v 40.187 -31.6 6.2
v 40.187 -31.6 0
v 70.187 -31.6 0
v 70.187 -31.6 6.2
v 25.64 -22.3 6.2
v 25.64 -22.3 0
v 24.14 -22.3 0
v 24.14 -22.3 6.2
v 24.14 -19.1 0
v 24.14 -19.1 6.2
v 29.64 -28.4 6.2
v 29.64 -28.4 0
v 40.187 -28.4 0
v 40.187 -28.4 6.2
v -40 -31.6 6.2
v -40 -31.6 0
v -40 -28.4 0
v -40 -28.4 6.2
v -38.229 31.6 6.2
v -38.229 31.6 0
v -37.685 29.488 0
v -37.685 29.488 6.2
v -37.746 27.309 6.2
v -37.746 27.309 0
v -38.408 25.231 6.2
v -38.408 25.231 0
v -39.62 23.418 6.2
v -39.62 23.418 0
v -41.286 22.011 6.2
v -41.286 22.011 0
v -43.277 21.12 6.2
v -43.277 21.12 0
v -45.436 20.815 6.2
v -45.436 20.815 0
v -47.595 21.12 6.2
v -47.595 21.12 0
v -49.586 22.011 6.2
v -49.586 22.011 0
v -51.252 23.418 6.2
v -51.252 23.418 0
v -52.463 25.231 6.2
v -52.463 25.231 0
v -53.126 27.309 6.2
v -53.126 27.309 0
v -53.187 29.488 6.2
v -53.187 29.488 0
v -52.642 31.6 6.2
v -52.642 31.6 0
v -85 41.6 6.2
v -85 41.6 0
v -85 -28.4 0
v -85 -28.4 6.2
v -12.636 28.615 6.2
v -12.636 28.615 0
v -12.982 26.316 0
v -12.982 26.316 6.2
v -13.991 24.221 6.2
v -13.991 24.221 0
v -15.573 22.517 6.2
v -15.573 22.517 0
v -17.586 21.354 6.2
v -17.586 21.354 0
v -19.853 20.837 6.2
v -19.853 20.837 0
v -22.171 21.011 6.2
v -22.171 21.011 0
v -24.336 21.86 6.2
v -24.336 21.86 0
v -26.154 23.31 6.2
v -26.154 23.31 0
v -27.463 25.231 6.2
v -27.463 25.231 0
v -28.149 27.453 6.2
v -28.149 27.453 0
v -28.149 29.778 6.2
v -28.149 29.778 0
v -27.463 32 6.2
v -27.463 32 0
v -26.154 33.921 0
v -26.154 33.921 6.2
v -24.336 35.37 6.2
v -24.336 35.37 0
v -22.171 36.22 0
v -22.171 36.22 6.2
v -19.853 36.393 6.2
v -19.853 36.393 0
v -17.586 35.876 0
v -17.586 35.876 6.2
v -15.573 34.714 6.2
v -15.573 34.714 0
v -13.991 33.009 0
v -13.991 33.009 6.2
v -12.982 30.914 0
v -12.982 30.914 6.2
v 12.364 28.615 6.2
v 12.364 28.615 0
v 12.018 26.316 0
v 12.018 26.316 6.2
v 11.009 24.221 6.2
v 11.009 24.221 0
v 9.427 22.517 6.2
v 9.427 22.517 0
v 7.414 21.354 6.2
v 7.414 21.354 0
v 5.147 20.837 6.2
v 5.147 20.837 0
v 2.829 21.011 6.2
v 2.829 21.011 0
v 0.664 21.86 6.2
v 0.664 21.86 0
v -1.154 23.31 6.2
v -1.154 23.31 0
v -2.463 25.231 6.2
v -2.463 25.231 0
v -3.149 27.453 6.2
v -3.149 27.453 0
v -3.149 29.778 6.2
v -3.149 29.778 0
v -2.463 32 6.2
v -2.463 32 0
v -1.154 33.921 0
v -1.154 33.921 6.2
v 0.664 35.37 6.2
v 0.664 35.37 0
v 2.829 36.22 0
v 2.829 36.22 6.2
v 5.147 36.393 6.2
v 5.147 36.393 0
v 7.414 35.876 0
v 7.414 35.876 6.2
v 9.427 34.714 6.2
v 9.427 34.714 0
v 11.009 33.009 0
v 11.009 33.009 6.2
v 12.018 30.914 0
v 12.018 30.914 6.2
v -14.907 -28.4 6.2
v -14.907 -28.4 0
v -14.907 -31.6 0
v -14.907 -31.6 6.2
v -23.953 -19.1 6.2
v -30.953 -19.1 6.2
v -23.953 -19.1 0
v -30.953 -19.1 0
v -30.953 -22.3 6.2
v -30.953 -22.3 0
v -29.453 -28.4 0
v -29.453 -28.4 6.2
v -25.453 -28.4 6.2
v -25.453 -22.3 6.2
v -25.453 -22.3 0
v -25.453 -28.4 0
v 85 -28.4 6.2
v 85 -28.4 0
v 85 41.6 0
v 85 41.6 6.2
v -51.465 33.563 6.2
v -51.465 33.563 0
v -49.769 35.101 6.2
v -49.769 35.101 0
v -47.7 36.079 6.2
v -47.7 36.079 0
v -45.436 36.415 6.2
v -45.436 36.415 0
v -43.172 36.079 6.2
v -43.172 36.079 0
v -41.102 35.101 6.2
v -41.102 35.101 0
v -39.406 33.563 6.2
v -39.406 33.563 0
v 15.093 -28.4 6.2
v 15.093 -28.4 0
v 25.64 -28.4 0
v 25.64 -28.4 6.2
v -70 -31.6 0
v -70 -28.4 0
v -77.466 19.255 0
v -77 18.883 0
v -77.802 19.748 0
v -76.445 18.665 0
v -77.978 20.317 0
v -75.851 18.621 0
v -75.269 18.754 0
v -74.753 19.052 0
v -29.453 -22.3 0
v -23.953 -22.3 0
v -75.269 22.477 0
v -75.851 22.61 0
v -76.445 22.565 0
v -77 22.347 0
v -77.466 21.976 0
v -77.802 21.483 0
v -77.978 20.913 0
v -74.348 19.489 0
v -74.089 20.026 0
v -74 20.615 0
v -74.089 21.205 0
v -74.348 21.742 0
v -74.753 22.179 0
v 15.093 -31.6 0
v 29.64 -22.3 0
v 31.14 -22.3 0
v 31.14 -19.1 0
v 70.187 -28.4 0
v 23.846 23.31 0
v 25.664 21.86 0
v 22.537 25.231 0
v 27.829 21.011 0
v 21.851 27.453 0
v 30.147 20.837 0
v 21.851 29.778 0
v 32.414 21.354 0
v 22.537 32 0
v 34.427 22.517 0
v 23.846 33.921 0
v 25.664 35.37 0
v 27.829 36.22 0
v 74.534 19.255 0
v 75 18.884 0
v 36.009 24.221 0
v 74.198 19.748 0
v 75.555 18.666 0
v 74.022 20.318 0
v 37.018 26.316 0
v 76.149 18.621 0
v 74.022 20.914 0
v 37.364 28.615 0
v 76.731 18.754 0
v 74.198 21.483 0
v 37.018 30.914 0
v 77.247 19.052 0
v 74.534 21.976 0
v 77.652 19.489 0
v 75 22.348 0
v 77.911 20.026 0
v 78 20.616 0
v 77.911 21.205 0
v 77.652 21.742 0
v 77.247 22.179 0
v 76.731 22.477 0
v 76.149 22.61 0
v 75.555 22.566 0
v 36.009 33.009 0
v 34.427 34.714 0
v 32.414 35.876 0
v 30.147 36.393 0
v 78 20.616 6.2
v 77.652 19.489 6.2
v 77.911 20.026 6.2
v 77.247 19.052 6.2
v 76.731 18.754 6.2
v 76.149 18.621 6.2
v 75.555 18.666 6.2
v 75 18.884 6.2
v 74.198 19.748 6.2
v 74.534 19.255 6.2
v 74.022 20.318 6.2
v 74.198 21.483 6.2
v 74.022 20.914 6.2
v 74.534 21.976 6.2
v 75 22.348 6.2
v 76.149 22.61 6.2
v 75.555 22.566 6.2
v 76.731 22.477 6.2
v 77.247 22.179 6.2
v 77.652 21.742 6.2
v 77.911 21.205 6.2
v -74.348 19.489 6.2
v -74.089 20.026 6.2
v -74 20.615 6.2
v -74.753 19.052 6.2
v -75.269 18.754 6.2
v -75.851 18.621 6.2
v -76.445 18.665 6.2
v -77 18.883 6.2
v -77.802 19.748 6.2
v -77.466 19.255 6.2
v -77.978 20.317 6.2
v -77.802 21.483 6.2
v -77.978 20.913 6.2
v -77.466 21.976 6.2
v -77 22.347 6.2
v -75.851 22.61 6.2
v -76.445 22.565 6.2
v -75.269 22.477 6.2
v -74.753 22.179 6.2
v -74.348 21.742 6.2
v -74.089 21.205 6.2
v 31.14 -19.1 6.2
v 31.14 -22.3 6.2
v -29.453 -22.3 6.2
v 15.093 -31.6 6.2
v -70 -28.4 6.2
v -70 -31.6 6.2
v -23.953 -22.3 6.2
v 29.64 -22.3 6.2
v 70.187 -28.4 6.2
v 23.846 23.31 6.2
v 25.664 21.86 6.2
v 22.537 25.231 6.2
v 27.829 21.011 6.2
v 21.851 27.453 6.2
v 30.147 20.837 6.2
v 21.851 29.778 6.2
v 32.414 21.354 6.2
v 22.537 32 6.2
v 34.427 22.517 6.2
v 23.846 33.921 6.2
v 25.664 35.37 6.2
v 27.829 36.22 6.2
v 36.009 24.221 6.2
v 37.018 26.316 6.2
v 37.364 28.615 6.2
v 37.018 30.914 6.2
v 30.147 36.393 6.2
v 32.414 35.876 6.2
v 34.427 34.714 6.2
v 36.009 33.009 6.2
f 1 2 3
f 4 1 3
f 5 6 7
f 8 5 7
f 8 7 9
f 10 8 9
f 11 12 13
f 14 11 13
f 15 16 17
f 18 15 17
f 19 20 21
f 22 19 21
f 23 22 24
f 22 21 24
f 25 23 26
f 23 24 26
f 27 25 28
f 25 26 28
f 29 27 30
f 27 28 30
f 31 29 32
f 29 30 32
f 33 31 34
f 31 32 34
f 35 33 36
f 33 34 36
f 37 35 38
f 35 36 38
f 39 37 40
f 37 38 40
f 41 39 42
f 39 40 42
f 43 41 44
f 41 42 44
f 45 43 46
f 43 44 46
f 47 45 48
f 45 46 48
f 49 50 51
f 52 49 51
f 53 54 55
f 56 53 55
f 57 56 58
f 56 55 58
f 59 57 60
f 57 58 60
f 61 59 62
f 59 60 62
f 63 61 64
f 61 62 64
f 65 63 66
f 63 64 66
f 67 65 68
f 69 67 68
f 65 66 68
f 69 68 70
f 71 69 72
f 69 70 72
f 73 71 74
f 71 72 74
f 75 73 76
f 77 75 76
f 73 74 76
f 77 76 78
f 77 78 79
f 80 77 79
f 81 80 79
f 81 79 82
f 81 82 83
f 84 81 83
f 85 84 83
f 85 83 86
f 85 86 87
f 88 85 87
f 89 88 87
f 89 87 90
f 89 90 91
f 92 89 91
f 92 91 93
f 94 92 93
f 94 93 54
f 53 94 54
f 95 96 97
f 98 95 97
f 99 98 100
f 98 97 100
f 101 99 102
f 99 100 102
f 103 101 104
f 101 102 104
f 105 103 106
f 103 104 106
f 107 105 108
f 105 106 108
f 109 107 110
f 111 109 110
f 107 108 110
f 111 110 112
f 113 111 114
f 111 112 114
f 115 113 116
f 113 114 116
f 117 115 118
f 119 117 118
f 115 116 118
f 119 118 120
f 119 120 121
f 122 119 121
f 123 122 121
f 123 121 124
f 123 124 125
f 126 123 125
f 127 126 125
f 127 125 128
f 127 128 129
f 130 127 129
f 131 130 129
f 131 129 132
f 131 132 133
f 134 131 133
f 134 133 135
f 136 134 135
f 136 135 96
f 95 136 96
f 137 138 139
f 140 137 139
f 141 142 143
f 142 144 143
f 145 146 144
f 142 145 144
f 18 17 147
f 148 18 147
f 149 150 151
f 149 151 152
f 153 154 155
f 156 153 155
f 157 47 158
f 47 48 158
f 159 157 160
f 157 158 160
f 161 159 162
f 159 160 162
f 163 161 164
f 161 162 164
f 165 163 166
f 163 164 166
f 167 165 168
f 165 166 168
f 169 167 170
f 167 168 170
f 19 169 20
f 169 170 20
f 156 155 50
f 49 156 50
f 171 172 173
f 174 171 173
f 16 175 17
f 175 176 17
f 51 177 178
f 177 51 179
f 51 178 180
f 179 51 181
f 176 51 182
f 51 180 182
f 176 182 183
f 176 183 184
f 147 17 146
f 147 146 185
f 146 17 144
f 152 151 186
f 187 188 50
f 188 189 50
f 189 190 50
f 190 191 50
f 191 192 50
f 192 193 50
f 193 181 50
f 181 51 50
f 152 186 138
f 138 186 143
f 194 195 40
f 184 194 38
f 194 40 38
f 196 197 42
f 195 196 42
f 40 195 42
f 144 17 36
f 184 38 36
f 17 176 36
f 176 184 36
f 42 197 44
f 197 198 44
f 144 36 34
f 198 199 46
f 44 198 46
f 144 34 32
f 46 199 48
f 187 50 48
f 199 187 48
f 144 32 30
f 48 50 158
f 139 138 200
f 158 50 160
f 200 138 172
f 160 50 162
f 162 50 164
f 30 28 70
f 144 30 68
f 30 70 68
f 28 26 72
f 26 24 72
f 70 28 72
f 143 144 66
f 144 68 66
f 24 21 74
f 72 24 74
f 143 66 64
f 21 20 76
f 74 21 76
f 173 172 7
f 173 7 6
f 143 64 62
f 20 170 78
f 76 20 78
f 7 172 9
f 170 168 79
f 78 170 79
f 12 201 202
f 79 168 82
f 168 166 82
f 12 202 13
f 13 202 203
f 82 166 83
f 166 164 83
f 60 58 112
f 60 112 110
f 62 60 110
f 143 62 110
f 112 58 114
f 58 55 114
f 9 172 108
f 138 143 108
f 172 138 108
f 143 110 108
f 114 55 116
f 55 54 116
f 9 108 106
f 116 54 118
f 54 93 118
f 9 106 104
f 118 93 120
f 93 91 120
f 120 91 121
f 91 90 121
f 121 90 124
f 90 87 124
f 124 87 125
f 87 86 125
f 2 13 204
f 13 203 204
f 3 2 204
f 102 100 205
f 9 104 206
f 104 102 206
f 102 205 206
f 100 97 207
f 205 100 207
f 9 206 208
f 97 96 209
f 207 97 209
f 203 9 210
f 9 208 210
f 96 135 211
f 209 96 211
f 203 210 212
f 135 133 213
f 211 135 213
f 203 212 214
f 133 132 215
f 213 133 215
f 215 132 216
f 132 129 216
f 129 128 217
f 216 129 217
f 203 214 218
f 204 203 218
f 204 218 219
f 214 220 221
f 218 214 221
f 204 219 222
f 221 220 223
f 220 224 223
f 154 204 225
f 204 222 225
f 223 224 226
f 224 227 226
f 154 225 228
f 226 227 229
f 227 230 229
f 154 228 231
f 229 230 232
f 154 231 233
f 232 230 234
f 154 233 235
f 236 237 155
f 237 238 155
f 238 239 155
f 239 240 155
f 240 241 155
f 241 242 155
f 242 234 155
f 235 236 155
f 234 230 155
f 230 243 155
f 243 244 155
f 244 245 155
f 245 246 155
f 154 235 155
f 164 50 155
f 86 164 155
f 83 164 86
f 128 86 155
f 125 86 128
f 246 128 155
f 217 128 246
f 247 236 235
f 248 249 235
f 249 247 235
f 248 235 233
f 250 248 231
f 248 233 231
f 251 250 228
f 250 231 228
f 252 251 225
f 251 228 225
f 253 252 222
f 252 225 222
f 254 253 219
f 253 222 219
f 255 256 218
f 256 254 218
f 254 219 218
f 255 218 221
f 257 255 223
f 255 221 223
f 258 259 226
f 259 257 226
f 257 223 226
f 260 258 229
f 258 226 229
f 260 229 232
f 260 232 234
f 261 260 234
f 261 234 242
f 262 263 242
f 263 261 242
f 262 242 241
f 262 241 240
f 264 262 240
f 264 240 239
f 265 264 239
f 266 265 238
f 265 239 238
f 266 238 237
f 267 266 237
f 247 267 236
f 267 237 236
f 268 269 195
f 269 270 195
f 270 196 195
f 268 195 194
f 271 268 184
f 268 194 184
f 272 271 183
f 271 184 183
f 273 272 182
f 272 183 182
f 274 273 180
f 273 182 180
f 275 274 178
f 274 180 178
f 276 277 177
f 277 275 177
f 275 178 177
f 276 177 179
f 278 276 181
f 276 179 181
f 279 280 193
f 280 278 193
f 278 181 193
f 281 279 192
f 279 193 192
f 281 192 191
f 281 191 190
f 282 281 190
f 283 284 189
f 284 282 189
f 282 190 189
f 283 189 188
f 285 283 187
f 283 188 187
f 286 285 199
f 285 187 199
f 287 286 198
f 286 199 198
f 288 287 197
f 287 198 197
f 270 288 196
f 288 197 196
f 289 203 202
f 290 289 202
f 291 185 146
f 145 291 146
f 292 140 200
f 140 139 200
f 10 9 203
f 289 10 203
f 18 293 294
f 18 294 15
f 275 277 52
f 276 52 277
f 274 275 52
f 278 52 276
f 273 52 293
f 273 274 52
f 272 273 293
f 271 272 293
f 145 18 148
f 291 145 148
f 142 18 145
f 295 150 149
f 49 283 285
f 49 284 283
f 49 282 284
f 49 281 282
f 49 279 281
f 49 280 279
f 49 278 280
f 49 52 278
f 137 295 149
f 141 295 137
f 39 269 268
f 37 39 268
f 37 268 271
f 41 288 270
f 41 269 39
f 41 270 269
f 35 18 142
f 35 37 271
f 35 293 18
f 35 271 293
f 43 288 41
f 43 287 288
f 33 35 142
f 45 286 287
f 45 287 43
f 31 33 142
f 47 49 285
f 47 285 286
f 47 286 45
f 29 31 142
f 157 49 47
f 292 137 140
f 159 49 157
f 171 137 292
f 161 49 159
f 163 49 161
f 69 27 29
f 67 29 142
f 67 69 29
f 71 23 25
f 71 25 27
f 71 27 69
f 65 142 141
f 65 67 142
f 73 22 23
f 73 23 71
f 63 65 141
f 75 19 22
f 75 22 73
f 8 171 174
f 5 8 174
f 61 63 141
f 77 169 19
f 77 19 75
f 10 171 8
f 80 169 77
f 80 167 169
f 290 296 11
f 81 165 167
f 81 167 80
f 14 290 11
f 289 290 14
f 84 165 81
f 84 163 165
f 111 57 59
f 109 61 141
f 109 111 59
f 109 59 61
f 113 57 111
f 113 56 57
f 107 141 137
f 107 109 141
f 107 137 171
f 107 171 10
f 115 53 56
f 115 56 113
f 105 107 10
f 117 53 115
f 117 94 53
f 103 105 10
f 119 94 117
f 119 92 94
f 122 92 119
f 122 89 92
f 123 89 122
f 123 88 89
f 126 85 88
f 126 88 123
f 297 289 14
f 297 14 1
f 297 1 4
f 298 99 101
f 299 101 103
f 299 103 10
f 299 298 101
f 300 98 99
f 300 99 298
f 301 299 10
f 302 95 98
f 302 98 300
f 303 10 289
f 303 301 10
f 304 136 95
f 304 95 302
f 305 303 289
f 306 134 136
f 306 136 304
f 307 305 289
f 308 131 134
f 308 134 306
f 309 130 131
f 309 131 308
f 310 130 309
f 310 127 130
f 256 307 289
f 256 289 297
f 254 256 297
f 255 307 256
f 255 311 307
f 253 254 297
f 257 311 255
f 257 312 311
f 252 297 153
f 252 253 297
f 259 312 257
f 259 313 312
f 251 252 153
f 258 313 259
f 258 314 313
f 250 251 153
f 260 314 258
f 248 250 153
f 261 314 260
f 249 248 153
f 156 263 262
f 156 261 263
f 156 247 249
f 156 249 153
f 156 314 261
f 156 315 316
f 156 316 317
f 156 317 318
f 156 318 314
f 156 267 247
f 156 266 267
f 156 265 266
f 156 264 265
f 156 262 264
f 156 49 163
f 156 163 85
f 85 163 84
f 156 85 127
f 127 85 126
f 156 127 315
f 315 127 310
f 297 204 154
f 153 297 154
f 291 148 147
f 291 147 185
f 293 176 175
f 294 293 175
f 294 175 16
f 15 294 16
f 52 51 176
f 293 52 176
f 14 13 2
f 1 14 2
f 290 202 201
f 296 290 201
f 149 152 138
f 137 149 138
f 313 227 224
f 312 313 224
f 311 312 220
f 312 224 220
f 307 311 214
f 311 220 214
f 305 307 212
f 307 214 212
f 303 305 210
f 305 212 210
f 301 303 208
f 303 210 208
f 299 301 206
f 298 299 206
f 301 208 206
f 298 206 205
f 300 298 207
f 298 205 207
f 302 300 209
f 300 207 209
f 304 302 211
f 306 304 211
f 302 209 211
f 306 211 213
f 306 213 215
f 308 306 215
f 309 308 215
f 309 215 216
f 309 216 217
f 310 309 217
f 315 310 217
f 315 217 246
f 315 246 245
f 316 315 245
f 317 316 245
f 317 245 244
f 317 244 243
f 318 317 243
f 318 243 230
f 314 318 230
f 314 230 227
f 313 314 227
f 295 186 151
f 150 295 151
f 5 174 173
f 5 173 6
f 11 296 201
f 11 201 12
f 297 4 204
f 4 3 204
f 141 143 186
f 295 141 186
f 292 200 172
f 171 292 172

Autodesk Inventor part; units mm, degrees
ref_plane "YZ Plane" through (0, 0, 0) normal (1, 0, 0) x (0, 1, 0)
ref_plane "XZ Plane" through (0, 0, 0) normal (0, 1, 0) x (-1, 0, 0)
ref_plane "XY Plane" through (0, 0, 0) normal (0, 0, 1) x (1, 0, 0)
sketch "Sketch1" plane through (0, 0, 0) normal (0, 0, 1) x (1, 0, 0)
  circle A0 centre (-76, 20.6153) radius 2 projected
  circle A1 centre (76, 20.6157) radius 2 projected
  line L0 (25.6401, -28.4) -> (25.6401, -22.3) projected
  line L1 (25.6401, -22.3) -> (24.1401, -22.3) projected
  line L2 (24.1401, -22.3) -> (24.1401, -19.1) projected
  line L3 (24.1401, -19.1) -> (31.1401, -19.1) projected
  line L4 (31.1401, -19.1) -> (31.1401, -22.3) projected
  line L5 (31.1401, -22.3) -> (29.6401, -22.3) projected
  line L6 (29.6401, -22.3) -> (29.6401, -28.4) projected
  line L7 (29.6401, -28.4) -> (40.1868, -28.4) projected
  line L8 (40.1868, -28.4) -> (40.1868, -31.6) projected
  line L9 (40.1868, -31.6) -> (70.1868, -31.6) projected
  line L10 (70.1868, -31.6) -> (70.1868, -28.4) projected
  line L11 (70.1868, -28.4) -> (85, -28.4) projected
  line L12 (85, -28.4) -> (85, 31.6) projected
  line L13 (85, 31.6) -> (70.6157, 31.6) projected
  arc A2 (56.2026, 31.6) -> (70.6157, 31.6) centre (63.4091, 28.6157) ccw projected
  line L14 (56.2026, 31.6) -> (33.0157, 31.6) projected
  arc A3 (18.603, 31.6) -> (33.0157, 31.6) centre (25.8094, 28.6153) ccw projected
  line L15 (18.603, 31.6) -> (-2.4569, 31.6) projected
  arc A4 (-16.8696, 31.6) -> (-2.4569, 31.6) centre (-9.6632, 28.6153) ccw projected
  line L16 (-16.8696, 31.6) -> (-38.2294, 31.6) projected
  arc A5 (-52.6422, 31.6) -> (-38.2294, 31.6) centre (-45.4358, 28.6153) ccw projected
  line L17 (-52.6422, 31.6) -> (-85, 31.6) projected
  line L18 (-85, 31.6) -> (-85, -28.4) projected
  line L19 (-85, -28.4) -> (-70, -28.4) projected
  line L20 (-70, -28.4) -> (-70, -31.6) projected
  line L21 (-70, -31.6) -> (-40, -31.6) projected
  line L22 (-40, -31.6) -> (-40, -28.4) projected
  line L23 (-40, -28.4) -> (-29.4533, -28.4) projected
  line L24 (-29.4533, -28.4) -> (-29.4533, -22.3) projected
  line L25 (-29.4533, -22.3) -> (-30.9533, -22.3) projected
  line L26 (-30.9533, -22.3) -> (-30.9533, -19.1) projected
  line L27 (-30.9533, -19.1) -> (-23.9533, -19.1) projected
  line L28 (-23.9533, -19.1) -> (-23.9533, -22.3) projected
  line L29 (-23.9533, -22.3) -> (-25.4533, -22.3) projected
  line L30 (-25.4533, -22.3) -> (-25.4533, -28.4) projected
  line L31 (-25.4533, -28.4) -> (-14.9066, -28.4) projected
  line L32 (-14.9066, -28.4) -> (-14.9066, -31.6) projected
  line L33 (-14.9066, -31.6) -> (15.0934, -31.6) projected
  line L34 (15.0934, -31.6) -> (15.0934, -28.4) projected
  line L35 (15.0934, -28.4) -> (25.6401, -28.4) projected
  circle A6 centre (-45.4358, 28.6153) radius 7.8
  circle A7 centre (-20.4358, 28.6153) radius 7.8
  circle A8 centre (4.5642, 28.6153) radius 7.8
  circle A9 centre (29.5642, 28.6153) radius 7.8
  line L36 (85, -28.4) -> (85, 41.6)
  line L37 (85, 41.6) -> (-85, 41.6)
  line L38 (-85, 41.6) -> (-85, -28.4)
  line L39 (-85, -28.4) -> (-70, -28.4)
  line L40 (-70, -28.4) -> (-70, -31.6)
  line L41 (-70, -31.6) -> (-40, -31.6)
  line L42 (-40, -31.6) -> (-40, -28.4)
  line L43 (-40, -28.4) -> (-29.4533, -28.4)
  line L44 (-29.4533, -28.4) -> (-29.4533, -22.3)
  line L45 (-29.4533, -22.3) -> (-30.9533, -22.3)
  line L46 (-30.9533, -22.3) -> (-30.9533, -19.1)
  line L47 (-30.9533, -19.1) -> (-23.9533, -19.1)
  line L48 (-23.9533, -19.1) -> (-23.9533, -22.3)
  line L49 (-23.9533, -22.3) -> (-25.4533, -22.3)
  line L50 (-25.4533, -22.3) -> (-25.4533, -28.4)
  line L51 (-25.4533, -28.4) -> (-14.9066, -28.4)
  line L52 (-14.9066, -28.4) -> (-14.9066, -31.6)
  line L53 (-14.9066, -31.6) -> (15.0934, -31.6)
  line L54 (15.0934, -31.6) -> (15.0934, -28.4)
  line L55 (15.0934, -28.4) -> (25.6401, -28.4)
  line L56 (25.6401, -28.4) -> (25.6401, -22.3)
  line L57 (25.6401, -22.3) -> (24.1401, -22.3)
  line L58 (24.1401, -22.3) -> (24.1401, -19.1)
  line L59 (24.1401, -19.1) -> (31.1401, -19.1)
  line L60 (31.1401, -19.1) -> (31.1401, -22.3)
  line L61 (31.1401, -22.3) -> (29.6401, -22.3)
  line L62 (29.6401, -22.3) -> (29.6401, -28.4)
  line L63 (29.6401, -28.4) -> (40.1868, -28.4)
  line L64 (40.1868, -28.4) -> (40.1868, -31.6)
  line L65 (40.1868, -31.6) -> (70.1868, -31.6)
  line L66 (70.1868, -31.6) -> (70.1868, -28.4)
  line L67 (85, -28.4) -> (70.1868, -28.4)
  circle A10 centre (76, 20.6157) radius 2
  circle A11 centre (-76, 20.6153) radius 2
  point P0 (0, 0)
  dimension "d0" = 25
  dimension "d1" = 25
  dimension "d2" = 25
  dimension "d3" = 70
extrude "Extrusion1" add sketch "Sketch1" along normal blind 6.2 contours L35 L34 L33 L32 L31 L30 L29 L28 L27 L26 L25 L24 L23 L22 L21 L20 L19 L18 L17 A5 L16 A7 A4 A8 L15 A3 A9 L14 A2 L13 L12 L11 L10 L9 L8 L7 L6 L5 L4 L3 L2 L1 L0 | L13 A2 L14 A9 A3 L15 A8 A4 A7 L16 A6 L17 L38 L37 L36
properties part number "caja_2_Lateral"
